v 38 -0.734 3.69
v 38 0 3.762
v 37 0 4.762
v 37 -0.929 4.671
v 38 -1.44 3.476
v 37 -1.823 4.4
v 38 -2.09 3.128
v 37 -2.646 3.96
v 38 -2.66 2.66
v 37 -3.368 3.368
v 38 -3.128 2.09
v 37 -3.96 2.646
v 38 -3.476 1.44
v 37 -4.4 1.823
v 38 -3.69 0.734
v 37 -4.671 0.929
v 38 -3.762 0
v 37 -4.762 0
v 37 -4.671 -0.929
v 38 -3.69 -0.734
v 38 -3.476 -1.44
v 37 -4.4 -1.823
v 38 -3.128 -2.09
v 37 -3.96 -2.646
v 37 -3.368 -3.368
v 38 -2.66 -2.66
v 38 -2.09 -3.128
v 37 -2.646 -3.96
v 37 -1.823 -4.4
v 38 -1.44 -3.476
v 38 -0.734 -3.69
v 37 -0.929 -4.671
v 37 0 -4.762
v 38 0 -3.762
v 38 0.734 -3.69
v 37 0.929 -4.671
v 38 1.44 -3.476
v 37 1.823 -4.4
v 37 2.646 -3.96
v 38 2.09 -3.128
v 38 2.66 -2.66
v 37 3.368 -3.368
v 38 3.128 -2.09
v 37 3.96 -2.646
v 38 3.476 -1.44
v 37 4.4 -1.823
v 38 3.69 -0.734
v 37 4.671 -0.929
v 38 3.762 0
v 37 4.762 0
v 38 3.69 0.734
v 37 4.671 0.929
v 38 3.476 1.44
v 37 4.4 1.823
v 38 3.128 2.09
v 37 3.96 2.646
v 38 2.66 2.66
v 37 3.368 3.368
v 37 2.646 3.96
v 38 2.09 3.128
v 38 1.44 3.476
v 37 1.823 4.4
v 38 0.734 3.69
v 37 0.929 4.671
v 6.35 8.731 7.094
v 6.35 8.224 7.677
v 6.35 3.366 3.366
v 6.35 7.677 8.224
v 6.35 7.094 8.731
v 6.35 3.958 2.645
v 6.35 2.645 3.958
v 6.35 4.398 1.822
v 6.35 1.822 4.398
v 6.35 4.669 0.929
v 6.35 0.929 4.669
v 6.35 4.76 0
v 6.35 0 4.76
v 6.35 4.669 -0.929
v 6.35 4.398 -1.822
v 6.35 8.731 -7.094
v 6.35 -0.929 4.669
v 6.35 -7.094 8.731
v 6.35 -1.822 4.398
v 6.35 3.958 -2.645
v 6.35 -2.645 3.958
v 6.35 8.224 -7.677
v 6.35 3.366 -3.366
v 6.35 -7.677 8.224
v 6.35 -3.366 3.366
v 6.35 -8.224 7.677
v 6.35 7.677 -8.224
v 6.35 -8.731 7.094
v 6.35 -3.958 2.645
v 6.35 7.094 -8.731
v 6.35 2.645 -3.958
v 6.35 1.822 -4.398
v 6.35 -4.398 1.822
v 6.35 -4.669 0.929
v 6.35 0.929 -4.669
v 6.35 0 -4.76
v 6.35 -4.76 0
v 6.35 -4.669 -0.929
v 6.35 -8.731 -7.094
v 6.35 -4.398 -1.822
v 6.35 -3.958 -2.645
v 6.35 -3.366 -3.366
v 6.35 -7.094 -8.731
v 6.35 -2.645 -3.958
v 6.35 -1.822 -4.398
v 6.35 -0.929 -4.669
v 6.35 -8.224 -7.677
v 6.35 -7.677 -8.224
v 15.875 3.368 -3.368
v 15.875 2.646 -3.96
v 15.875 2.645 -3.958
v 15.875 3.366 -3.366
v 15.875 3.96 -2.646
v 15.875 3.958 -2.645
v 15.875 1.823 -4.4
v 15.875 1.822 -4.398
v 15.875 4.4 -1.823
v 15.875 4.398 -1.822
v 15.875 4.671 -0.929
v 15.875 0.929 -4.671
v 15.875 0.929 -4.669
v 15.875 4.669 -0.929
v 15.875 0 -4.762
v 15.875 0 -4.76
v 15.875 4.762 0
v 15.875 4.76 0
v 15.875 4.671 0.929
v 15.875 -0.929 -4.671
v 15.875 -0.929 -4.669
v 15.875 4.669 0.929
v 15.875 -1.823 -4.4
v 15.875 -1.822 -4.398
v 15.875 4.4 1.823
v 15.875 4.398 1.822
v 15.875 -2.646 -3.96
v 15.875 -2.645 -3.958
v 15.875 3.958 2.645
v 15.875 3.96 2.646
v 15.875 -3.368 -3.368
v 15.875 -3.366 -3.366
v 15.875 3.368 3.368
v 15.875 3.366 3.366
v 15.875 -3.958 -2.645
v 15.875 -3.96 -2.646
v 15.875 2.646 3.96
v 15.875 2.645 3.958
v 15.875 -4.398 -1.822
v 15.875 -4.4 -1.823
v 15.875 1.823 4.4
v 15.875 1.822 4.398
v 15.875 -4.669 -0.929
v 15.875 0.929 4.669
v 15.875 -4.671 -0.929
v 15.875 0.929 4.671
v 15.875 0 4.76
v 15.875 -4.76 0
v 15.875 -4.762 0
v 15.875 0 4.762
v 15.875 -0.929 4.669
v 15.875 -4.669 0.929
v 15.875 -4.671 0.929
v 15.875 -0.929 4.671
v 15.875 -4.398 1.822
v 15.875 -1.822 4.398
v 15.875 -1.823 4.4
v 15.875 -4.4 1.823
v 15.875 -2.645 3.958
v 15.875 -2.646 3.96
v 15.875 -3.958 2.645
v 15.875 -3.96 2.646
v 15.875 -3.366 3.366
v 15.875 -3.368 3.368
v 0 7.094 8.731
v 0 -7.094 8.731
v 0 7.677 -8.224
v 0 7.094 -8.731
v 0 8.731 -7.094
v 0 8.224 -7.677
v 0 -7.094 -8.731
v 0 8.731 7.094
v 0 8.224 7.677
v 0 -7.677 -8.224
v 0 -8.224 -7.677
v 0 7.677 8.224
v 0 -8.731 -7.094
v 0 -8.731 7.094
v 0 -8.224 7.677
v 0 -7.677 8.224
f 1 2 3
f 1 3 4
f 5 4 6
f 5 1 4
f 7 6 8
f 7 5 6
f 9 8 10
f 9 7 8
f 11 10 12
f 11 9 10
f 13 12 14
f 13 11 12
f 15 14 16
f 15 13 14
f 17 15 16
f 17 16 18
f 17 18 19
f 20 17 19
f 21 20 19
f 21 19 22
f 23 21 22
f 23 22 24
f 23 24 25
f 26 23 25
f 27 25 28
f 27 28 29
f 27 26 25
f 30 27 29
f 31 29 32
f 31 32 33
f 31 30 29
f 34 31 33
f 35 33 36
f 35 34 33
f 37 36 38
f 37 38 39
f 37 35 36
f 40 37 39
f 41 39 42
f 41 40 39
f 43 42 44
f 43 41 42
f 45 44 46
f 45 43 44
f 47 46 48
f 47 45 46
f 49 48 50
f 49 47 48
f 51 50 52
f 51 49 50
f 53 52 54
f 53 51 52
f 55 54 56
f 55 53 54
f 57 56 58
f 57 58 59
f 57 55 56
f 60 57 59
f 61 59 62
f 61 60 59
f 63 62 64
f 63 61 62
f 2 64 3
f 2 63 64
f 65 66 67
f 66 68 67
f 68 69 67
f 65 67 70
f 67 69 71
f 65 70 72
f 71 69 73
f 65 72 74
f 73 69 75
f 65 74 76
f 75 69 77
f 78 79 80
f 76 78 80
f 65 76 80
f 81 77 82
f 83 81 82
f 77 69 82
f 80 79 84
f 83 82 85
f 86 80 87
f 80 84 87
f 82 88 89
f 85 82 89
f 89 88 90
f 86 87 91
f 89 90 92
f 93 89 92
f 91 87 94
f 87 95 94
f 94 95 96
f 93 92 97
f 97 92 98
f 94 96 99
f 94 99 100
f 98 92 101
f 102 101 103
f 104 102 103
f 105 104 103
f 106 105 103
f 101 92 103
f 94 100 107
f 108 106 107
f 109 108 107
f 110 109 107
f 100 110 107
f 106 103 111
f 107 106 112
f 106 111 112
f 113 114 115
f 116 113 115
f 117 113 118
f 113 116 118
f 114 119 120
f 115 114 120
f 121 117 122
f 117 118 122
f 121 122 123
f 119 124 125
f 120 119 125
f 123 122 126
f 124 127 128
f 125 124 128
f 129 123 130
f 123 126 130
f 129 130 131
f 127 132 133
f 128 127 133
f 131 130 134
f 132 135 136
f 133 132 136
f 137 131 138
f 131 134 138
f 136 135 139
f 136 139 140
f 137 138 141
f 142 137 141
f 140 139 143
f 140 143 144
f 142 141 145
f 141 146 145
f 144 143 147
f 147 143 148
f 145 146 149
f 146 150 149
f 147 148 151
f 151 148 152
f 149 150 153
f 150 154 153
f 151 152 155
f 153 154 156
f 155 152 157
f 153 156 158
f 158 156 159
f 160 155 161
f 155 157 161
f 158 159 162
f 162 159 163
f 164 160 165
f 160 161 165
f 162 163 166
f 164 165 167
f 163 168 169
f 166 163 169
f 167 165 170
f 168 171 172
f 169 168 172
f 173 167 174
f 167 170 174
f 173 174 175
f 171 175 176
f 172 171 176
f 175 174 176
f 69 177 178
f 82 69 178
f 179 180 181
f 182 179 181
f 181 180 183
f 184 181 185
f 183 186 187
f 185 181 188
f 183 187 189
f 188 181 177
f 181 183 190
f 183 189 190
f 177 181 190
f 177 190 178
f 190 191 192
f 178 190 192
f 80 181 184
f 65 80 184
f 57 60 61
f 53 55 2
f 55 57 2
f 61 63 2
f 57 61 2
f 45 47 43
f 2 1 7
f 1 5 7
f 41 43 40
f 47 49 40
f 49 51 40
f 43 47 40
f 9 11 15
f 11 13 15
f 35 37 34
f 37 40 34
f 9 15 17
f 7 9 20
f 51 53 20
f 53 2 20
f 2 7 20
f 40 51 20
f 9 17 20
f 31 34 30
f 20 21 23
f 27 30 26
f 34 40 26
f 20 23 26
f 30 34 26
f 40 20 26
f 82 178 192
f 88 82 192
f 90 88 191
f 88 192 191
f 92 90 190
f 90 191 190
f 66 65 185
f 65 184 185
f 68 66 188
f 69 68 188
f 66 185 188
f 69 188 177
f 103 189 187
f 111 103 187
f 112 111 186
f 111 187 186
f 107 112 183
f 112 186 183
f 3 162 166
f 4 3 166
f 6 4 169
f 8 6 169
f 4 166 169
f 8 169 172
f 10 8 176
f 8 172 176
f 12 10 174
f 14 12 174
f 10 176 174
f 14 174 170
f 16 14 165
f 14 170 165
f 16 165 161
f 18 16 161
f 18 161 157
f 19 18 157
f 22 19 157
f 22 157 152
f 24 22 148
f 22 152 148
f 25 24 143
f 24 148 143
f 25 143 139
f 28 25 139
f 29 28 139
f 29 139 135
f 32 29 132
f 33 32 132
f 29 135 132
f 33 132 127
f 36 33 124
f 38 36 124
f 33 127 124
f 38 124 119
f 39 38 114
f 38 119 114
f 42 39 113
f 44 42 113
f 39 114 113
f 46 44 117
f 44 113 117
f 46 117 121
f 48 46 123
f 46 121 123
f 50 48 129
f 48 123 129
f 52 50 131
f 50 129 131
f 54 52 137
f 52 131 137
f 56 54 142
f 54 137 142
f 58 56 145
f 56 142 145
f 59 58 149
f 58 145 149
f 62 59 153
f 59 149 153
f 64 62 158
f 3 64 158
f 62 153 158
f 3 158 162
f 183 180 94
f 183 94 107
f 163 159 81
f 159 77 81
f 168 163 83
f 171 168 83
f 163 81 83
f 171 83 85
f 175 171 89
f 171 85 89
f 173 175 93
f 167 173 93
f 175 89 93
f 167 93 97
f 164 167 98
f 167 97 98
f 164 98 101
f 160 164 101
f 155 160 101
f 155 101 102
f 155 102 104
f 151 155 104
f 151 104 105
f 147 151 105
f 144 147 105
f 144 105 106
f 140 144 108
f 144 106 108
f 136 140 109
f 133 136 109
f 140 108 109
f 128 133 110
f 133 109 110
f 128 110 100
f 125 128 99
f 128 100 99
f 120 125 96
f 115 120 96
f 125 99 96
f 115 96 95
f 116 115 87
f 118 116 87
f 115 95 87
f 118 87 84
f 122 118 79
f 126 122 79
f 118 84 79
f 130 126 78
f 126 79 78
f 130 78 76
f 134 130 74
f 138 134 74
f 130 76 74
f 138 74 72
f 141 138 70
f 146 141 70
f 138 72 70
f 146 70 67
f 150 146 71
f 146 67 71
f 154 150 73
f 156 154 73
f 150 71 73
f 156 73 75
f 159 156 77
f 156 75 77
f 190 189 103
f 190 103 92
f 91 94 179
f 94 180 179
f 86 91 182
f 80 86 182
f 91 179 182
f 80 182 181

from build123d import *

# Parameters (mm, degrees)
F2_W     = 2.51875
F2_H     = 14.188414
F2_W_2   = 14.188414
F2_H_2   = 2.51875
F3_DEPTH = 6.35
F4_SIZE  = 1


with BuildPart() as f1:
    # F0 (on Front) → F1 (revolve)
    with BuildSketch(Plane.XZ):
        Polygon((0, 11.25), (0, 0), (38, 0), (38, 4.7625), (15.875, 4.7625), (15.875, 4.76), (6.35, 4.76), (6.35, 11.25), align=None)
    revolve(axis=Axis((19, 0, 0), (1, 0, 0)))

    # F2 (on face) → F3 (cut, through all)
    with BuildSketch(Plane(origin=(0, 0, 0), x_dir=(0, -1, 0), z_dir=(-1, 0, 0))):
        with Locations((-9.990625, 0)):
            Rectangle(F2_W, F2_H)
        with Locations((9.990625, 0)):
            Rectangle(F2_W, F2_H)
        with Locations((0, 9.990625)):
            Rectangle(F2_W_2, F2_H_2)
        with Locations((0, -9.990625)):
            Rectangle(F2_W_2, F2_H_2)
    extrude(amount=-F3_DEPTH, mode=Mode.SUBTRACT)

    # F4
    f4_edges = [f1.edges().sort_by_distance(p)[0] for p in [
        (38, 0, -4.7625),
    ]]
    chamfer(f4_edges, length=F4_SIZE)


solid = f1.part
